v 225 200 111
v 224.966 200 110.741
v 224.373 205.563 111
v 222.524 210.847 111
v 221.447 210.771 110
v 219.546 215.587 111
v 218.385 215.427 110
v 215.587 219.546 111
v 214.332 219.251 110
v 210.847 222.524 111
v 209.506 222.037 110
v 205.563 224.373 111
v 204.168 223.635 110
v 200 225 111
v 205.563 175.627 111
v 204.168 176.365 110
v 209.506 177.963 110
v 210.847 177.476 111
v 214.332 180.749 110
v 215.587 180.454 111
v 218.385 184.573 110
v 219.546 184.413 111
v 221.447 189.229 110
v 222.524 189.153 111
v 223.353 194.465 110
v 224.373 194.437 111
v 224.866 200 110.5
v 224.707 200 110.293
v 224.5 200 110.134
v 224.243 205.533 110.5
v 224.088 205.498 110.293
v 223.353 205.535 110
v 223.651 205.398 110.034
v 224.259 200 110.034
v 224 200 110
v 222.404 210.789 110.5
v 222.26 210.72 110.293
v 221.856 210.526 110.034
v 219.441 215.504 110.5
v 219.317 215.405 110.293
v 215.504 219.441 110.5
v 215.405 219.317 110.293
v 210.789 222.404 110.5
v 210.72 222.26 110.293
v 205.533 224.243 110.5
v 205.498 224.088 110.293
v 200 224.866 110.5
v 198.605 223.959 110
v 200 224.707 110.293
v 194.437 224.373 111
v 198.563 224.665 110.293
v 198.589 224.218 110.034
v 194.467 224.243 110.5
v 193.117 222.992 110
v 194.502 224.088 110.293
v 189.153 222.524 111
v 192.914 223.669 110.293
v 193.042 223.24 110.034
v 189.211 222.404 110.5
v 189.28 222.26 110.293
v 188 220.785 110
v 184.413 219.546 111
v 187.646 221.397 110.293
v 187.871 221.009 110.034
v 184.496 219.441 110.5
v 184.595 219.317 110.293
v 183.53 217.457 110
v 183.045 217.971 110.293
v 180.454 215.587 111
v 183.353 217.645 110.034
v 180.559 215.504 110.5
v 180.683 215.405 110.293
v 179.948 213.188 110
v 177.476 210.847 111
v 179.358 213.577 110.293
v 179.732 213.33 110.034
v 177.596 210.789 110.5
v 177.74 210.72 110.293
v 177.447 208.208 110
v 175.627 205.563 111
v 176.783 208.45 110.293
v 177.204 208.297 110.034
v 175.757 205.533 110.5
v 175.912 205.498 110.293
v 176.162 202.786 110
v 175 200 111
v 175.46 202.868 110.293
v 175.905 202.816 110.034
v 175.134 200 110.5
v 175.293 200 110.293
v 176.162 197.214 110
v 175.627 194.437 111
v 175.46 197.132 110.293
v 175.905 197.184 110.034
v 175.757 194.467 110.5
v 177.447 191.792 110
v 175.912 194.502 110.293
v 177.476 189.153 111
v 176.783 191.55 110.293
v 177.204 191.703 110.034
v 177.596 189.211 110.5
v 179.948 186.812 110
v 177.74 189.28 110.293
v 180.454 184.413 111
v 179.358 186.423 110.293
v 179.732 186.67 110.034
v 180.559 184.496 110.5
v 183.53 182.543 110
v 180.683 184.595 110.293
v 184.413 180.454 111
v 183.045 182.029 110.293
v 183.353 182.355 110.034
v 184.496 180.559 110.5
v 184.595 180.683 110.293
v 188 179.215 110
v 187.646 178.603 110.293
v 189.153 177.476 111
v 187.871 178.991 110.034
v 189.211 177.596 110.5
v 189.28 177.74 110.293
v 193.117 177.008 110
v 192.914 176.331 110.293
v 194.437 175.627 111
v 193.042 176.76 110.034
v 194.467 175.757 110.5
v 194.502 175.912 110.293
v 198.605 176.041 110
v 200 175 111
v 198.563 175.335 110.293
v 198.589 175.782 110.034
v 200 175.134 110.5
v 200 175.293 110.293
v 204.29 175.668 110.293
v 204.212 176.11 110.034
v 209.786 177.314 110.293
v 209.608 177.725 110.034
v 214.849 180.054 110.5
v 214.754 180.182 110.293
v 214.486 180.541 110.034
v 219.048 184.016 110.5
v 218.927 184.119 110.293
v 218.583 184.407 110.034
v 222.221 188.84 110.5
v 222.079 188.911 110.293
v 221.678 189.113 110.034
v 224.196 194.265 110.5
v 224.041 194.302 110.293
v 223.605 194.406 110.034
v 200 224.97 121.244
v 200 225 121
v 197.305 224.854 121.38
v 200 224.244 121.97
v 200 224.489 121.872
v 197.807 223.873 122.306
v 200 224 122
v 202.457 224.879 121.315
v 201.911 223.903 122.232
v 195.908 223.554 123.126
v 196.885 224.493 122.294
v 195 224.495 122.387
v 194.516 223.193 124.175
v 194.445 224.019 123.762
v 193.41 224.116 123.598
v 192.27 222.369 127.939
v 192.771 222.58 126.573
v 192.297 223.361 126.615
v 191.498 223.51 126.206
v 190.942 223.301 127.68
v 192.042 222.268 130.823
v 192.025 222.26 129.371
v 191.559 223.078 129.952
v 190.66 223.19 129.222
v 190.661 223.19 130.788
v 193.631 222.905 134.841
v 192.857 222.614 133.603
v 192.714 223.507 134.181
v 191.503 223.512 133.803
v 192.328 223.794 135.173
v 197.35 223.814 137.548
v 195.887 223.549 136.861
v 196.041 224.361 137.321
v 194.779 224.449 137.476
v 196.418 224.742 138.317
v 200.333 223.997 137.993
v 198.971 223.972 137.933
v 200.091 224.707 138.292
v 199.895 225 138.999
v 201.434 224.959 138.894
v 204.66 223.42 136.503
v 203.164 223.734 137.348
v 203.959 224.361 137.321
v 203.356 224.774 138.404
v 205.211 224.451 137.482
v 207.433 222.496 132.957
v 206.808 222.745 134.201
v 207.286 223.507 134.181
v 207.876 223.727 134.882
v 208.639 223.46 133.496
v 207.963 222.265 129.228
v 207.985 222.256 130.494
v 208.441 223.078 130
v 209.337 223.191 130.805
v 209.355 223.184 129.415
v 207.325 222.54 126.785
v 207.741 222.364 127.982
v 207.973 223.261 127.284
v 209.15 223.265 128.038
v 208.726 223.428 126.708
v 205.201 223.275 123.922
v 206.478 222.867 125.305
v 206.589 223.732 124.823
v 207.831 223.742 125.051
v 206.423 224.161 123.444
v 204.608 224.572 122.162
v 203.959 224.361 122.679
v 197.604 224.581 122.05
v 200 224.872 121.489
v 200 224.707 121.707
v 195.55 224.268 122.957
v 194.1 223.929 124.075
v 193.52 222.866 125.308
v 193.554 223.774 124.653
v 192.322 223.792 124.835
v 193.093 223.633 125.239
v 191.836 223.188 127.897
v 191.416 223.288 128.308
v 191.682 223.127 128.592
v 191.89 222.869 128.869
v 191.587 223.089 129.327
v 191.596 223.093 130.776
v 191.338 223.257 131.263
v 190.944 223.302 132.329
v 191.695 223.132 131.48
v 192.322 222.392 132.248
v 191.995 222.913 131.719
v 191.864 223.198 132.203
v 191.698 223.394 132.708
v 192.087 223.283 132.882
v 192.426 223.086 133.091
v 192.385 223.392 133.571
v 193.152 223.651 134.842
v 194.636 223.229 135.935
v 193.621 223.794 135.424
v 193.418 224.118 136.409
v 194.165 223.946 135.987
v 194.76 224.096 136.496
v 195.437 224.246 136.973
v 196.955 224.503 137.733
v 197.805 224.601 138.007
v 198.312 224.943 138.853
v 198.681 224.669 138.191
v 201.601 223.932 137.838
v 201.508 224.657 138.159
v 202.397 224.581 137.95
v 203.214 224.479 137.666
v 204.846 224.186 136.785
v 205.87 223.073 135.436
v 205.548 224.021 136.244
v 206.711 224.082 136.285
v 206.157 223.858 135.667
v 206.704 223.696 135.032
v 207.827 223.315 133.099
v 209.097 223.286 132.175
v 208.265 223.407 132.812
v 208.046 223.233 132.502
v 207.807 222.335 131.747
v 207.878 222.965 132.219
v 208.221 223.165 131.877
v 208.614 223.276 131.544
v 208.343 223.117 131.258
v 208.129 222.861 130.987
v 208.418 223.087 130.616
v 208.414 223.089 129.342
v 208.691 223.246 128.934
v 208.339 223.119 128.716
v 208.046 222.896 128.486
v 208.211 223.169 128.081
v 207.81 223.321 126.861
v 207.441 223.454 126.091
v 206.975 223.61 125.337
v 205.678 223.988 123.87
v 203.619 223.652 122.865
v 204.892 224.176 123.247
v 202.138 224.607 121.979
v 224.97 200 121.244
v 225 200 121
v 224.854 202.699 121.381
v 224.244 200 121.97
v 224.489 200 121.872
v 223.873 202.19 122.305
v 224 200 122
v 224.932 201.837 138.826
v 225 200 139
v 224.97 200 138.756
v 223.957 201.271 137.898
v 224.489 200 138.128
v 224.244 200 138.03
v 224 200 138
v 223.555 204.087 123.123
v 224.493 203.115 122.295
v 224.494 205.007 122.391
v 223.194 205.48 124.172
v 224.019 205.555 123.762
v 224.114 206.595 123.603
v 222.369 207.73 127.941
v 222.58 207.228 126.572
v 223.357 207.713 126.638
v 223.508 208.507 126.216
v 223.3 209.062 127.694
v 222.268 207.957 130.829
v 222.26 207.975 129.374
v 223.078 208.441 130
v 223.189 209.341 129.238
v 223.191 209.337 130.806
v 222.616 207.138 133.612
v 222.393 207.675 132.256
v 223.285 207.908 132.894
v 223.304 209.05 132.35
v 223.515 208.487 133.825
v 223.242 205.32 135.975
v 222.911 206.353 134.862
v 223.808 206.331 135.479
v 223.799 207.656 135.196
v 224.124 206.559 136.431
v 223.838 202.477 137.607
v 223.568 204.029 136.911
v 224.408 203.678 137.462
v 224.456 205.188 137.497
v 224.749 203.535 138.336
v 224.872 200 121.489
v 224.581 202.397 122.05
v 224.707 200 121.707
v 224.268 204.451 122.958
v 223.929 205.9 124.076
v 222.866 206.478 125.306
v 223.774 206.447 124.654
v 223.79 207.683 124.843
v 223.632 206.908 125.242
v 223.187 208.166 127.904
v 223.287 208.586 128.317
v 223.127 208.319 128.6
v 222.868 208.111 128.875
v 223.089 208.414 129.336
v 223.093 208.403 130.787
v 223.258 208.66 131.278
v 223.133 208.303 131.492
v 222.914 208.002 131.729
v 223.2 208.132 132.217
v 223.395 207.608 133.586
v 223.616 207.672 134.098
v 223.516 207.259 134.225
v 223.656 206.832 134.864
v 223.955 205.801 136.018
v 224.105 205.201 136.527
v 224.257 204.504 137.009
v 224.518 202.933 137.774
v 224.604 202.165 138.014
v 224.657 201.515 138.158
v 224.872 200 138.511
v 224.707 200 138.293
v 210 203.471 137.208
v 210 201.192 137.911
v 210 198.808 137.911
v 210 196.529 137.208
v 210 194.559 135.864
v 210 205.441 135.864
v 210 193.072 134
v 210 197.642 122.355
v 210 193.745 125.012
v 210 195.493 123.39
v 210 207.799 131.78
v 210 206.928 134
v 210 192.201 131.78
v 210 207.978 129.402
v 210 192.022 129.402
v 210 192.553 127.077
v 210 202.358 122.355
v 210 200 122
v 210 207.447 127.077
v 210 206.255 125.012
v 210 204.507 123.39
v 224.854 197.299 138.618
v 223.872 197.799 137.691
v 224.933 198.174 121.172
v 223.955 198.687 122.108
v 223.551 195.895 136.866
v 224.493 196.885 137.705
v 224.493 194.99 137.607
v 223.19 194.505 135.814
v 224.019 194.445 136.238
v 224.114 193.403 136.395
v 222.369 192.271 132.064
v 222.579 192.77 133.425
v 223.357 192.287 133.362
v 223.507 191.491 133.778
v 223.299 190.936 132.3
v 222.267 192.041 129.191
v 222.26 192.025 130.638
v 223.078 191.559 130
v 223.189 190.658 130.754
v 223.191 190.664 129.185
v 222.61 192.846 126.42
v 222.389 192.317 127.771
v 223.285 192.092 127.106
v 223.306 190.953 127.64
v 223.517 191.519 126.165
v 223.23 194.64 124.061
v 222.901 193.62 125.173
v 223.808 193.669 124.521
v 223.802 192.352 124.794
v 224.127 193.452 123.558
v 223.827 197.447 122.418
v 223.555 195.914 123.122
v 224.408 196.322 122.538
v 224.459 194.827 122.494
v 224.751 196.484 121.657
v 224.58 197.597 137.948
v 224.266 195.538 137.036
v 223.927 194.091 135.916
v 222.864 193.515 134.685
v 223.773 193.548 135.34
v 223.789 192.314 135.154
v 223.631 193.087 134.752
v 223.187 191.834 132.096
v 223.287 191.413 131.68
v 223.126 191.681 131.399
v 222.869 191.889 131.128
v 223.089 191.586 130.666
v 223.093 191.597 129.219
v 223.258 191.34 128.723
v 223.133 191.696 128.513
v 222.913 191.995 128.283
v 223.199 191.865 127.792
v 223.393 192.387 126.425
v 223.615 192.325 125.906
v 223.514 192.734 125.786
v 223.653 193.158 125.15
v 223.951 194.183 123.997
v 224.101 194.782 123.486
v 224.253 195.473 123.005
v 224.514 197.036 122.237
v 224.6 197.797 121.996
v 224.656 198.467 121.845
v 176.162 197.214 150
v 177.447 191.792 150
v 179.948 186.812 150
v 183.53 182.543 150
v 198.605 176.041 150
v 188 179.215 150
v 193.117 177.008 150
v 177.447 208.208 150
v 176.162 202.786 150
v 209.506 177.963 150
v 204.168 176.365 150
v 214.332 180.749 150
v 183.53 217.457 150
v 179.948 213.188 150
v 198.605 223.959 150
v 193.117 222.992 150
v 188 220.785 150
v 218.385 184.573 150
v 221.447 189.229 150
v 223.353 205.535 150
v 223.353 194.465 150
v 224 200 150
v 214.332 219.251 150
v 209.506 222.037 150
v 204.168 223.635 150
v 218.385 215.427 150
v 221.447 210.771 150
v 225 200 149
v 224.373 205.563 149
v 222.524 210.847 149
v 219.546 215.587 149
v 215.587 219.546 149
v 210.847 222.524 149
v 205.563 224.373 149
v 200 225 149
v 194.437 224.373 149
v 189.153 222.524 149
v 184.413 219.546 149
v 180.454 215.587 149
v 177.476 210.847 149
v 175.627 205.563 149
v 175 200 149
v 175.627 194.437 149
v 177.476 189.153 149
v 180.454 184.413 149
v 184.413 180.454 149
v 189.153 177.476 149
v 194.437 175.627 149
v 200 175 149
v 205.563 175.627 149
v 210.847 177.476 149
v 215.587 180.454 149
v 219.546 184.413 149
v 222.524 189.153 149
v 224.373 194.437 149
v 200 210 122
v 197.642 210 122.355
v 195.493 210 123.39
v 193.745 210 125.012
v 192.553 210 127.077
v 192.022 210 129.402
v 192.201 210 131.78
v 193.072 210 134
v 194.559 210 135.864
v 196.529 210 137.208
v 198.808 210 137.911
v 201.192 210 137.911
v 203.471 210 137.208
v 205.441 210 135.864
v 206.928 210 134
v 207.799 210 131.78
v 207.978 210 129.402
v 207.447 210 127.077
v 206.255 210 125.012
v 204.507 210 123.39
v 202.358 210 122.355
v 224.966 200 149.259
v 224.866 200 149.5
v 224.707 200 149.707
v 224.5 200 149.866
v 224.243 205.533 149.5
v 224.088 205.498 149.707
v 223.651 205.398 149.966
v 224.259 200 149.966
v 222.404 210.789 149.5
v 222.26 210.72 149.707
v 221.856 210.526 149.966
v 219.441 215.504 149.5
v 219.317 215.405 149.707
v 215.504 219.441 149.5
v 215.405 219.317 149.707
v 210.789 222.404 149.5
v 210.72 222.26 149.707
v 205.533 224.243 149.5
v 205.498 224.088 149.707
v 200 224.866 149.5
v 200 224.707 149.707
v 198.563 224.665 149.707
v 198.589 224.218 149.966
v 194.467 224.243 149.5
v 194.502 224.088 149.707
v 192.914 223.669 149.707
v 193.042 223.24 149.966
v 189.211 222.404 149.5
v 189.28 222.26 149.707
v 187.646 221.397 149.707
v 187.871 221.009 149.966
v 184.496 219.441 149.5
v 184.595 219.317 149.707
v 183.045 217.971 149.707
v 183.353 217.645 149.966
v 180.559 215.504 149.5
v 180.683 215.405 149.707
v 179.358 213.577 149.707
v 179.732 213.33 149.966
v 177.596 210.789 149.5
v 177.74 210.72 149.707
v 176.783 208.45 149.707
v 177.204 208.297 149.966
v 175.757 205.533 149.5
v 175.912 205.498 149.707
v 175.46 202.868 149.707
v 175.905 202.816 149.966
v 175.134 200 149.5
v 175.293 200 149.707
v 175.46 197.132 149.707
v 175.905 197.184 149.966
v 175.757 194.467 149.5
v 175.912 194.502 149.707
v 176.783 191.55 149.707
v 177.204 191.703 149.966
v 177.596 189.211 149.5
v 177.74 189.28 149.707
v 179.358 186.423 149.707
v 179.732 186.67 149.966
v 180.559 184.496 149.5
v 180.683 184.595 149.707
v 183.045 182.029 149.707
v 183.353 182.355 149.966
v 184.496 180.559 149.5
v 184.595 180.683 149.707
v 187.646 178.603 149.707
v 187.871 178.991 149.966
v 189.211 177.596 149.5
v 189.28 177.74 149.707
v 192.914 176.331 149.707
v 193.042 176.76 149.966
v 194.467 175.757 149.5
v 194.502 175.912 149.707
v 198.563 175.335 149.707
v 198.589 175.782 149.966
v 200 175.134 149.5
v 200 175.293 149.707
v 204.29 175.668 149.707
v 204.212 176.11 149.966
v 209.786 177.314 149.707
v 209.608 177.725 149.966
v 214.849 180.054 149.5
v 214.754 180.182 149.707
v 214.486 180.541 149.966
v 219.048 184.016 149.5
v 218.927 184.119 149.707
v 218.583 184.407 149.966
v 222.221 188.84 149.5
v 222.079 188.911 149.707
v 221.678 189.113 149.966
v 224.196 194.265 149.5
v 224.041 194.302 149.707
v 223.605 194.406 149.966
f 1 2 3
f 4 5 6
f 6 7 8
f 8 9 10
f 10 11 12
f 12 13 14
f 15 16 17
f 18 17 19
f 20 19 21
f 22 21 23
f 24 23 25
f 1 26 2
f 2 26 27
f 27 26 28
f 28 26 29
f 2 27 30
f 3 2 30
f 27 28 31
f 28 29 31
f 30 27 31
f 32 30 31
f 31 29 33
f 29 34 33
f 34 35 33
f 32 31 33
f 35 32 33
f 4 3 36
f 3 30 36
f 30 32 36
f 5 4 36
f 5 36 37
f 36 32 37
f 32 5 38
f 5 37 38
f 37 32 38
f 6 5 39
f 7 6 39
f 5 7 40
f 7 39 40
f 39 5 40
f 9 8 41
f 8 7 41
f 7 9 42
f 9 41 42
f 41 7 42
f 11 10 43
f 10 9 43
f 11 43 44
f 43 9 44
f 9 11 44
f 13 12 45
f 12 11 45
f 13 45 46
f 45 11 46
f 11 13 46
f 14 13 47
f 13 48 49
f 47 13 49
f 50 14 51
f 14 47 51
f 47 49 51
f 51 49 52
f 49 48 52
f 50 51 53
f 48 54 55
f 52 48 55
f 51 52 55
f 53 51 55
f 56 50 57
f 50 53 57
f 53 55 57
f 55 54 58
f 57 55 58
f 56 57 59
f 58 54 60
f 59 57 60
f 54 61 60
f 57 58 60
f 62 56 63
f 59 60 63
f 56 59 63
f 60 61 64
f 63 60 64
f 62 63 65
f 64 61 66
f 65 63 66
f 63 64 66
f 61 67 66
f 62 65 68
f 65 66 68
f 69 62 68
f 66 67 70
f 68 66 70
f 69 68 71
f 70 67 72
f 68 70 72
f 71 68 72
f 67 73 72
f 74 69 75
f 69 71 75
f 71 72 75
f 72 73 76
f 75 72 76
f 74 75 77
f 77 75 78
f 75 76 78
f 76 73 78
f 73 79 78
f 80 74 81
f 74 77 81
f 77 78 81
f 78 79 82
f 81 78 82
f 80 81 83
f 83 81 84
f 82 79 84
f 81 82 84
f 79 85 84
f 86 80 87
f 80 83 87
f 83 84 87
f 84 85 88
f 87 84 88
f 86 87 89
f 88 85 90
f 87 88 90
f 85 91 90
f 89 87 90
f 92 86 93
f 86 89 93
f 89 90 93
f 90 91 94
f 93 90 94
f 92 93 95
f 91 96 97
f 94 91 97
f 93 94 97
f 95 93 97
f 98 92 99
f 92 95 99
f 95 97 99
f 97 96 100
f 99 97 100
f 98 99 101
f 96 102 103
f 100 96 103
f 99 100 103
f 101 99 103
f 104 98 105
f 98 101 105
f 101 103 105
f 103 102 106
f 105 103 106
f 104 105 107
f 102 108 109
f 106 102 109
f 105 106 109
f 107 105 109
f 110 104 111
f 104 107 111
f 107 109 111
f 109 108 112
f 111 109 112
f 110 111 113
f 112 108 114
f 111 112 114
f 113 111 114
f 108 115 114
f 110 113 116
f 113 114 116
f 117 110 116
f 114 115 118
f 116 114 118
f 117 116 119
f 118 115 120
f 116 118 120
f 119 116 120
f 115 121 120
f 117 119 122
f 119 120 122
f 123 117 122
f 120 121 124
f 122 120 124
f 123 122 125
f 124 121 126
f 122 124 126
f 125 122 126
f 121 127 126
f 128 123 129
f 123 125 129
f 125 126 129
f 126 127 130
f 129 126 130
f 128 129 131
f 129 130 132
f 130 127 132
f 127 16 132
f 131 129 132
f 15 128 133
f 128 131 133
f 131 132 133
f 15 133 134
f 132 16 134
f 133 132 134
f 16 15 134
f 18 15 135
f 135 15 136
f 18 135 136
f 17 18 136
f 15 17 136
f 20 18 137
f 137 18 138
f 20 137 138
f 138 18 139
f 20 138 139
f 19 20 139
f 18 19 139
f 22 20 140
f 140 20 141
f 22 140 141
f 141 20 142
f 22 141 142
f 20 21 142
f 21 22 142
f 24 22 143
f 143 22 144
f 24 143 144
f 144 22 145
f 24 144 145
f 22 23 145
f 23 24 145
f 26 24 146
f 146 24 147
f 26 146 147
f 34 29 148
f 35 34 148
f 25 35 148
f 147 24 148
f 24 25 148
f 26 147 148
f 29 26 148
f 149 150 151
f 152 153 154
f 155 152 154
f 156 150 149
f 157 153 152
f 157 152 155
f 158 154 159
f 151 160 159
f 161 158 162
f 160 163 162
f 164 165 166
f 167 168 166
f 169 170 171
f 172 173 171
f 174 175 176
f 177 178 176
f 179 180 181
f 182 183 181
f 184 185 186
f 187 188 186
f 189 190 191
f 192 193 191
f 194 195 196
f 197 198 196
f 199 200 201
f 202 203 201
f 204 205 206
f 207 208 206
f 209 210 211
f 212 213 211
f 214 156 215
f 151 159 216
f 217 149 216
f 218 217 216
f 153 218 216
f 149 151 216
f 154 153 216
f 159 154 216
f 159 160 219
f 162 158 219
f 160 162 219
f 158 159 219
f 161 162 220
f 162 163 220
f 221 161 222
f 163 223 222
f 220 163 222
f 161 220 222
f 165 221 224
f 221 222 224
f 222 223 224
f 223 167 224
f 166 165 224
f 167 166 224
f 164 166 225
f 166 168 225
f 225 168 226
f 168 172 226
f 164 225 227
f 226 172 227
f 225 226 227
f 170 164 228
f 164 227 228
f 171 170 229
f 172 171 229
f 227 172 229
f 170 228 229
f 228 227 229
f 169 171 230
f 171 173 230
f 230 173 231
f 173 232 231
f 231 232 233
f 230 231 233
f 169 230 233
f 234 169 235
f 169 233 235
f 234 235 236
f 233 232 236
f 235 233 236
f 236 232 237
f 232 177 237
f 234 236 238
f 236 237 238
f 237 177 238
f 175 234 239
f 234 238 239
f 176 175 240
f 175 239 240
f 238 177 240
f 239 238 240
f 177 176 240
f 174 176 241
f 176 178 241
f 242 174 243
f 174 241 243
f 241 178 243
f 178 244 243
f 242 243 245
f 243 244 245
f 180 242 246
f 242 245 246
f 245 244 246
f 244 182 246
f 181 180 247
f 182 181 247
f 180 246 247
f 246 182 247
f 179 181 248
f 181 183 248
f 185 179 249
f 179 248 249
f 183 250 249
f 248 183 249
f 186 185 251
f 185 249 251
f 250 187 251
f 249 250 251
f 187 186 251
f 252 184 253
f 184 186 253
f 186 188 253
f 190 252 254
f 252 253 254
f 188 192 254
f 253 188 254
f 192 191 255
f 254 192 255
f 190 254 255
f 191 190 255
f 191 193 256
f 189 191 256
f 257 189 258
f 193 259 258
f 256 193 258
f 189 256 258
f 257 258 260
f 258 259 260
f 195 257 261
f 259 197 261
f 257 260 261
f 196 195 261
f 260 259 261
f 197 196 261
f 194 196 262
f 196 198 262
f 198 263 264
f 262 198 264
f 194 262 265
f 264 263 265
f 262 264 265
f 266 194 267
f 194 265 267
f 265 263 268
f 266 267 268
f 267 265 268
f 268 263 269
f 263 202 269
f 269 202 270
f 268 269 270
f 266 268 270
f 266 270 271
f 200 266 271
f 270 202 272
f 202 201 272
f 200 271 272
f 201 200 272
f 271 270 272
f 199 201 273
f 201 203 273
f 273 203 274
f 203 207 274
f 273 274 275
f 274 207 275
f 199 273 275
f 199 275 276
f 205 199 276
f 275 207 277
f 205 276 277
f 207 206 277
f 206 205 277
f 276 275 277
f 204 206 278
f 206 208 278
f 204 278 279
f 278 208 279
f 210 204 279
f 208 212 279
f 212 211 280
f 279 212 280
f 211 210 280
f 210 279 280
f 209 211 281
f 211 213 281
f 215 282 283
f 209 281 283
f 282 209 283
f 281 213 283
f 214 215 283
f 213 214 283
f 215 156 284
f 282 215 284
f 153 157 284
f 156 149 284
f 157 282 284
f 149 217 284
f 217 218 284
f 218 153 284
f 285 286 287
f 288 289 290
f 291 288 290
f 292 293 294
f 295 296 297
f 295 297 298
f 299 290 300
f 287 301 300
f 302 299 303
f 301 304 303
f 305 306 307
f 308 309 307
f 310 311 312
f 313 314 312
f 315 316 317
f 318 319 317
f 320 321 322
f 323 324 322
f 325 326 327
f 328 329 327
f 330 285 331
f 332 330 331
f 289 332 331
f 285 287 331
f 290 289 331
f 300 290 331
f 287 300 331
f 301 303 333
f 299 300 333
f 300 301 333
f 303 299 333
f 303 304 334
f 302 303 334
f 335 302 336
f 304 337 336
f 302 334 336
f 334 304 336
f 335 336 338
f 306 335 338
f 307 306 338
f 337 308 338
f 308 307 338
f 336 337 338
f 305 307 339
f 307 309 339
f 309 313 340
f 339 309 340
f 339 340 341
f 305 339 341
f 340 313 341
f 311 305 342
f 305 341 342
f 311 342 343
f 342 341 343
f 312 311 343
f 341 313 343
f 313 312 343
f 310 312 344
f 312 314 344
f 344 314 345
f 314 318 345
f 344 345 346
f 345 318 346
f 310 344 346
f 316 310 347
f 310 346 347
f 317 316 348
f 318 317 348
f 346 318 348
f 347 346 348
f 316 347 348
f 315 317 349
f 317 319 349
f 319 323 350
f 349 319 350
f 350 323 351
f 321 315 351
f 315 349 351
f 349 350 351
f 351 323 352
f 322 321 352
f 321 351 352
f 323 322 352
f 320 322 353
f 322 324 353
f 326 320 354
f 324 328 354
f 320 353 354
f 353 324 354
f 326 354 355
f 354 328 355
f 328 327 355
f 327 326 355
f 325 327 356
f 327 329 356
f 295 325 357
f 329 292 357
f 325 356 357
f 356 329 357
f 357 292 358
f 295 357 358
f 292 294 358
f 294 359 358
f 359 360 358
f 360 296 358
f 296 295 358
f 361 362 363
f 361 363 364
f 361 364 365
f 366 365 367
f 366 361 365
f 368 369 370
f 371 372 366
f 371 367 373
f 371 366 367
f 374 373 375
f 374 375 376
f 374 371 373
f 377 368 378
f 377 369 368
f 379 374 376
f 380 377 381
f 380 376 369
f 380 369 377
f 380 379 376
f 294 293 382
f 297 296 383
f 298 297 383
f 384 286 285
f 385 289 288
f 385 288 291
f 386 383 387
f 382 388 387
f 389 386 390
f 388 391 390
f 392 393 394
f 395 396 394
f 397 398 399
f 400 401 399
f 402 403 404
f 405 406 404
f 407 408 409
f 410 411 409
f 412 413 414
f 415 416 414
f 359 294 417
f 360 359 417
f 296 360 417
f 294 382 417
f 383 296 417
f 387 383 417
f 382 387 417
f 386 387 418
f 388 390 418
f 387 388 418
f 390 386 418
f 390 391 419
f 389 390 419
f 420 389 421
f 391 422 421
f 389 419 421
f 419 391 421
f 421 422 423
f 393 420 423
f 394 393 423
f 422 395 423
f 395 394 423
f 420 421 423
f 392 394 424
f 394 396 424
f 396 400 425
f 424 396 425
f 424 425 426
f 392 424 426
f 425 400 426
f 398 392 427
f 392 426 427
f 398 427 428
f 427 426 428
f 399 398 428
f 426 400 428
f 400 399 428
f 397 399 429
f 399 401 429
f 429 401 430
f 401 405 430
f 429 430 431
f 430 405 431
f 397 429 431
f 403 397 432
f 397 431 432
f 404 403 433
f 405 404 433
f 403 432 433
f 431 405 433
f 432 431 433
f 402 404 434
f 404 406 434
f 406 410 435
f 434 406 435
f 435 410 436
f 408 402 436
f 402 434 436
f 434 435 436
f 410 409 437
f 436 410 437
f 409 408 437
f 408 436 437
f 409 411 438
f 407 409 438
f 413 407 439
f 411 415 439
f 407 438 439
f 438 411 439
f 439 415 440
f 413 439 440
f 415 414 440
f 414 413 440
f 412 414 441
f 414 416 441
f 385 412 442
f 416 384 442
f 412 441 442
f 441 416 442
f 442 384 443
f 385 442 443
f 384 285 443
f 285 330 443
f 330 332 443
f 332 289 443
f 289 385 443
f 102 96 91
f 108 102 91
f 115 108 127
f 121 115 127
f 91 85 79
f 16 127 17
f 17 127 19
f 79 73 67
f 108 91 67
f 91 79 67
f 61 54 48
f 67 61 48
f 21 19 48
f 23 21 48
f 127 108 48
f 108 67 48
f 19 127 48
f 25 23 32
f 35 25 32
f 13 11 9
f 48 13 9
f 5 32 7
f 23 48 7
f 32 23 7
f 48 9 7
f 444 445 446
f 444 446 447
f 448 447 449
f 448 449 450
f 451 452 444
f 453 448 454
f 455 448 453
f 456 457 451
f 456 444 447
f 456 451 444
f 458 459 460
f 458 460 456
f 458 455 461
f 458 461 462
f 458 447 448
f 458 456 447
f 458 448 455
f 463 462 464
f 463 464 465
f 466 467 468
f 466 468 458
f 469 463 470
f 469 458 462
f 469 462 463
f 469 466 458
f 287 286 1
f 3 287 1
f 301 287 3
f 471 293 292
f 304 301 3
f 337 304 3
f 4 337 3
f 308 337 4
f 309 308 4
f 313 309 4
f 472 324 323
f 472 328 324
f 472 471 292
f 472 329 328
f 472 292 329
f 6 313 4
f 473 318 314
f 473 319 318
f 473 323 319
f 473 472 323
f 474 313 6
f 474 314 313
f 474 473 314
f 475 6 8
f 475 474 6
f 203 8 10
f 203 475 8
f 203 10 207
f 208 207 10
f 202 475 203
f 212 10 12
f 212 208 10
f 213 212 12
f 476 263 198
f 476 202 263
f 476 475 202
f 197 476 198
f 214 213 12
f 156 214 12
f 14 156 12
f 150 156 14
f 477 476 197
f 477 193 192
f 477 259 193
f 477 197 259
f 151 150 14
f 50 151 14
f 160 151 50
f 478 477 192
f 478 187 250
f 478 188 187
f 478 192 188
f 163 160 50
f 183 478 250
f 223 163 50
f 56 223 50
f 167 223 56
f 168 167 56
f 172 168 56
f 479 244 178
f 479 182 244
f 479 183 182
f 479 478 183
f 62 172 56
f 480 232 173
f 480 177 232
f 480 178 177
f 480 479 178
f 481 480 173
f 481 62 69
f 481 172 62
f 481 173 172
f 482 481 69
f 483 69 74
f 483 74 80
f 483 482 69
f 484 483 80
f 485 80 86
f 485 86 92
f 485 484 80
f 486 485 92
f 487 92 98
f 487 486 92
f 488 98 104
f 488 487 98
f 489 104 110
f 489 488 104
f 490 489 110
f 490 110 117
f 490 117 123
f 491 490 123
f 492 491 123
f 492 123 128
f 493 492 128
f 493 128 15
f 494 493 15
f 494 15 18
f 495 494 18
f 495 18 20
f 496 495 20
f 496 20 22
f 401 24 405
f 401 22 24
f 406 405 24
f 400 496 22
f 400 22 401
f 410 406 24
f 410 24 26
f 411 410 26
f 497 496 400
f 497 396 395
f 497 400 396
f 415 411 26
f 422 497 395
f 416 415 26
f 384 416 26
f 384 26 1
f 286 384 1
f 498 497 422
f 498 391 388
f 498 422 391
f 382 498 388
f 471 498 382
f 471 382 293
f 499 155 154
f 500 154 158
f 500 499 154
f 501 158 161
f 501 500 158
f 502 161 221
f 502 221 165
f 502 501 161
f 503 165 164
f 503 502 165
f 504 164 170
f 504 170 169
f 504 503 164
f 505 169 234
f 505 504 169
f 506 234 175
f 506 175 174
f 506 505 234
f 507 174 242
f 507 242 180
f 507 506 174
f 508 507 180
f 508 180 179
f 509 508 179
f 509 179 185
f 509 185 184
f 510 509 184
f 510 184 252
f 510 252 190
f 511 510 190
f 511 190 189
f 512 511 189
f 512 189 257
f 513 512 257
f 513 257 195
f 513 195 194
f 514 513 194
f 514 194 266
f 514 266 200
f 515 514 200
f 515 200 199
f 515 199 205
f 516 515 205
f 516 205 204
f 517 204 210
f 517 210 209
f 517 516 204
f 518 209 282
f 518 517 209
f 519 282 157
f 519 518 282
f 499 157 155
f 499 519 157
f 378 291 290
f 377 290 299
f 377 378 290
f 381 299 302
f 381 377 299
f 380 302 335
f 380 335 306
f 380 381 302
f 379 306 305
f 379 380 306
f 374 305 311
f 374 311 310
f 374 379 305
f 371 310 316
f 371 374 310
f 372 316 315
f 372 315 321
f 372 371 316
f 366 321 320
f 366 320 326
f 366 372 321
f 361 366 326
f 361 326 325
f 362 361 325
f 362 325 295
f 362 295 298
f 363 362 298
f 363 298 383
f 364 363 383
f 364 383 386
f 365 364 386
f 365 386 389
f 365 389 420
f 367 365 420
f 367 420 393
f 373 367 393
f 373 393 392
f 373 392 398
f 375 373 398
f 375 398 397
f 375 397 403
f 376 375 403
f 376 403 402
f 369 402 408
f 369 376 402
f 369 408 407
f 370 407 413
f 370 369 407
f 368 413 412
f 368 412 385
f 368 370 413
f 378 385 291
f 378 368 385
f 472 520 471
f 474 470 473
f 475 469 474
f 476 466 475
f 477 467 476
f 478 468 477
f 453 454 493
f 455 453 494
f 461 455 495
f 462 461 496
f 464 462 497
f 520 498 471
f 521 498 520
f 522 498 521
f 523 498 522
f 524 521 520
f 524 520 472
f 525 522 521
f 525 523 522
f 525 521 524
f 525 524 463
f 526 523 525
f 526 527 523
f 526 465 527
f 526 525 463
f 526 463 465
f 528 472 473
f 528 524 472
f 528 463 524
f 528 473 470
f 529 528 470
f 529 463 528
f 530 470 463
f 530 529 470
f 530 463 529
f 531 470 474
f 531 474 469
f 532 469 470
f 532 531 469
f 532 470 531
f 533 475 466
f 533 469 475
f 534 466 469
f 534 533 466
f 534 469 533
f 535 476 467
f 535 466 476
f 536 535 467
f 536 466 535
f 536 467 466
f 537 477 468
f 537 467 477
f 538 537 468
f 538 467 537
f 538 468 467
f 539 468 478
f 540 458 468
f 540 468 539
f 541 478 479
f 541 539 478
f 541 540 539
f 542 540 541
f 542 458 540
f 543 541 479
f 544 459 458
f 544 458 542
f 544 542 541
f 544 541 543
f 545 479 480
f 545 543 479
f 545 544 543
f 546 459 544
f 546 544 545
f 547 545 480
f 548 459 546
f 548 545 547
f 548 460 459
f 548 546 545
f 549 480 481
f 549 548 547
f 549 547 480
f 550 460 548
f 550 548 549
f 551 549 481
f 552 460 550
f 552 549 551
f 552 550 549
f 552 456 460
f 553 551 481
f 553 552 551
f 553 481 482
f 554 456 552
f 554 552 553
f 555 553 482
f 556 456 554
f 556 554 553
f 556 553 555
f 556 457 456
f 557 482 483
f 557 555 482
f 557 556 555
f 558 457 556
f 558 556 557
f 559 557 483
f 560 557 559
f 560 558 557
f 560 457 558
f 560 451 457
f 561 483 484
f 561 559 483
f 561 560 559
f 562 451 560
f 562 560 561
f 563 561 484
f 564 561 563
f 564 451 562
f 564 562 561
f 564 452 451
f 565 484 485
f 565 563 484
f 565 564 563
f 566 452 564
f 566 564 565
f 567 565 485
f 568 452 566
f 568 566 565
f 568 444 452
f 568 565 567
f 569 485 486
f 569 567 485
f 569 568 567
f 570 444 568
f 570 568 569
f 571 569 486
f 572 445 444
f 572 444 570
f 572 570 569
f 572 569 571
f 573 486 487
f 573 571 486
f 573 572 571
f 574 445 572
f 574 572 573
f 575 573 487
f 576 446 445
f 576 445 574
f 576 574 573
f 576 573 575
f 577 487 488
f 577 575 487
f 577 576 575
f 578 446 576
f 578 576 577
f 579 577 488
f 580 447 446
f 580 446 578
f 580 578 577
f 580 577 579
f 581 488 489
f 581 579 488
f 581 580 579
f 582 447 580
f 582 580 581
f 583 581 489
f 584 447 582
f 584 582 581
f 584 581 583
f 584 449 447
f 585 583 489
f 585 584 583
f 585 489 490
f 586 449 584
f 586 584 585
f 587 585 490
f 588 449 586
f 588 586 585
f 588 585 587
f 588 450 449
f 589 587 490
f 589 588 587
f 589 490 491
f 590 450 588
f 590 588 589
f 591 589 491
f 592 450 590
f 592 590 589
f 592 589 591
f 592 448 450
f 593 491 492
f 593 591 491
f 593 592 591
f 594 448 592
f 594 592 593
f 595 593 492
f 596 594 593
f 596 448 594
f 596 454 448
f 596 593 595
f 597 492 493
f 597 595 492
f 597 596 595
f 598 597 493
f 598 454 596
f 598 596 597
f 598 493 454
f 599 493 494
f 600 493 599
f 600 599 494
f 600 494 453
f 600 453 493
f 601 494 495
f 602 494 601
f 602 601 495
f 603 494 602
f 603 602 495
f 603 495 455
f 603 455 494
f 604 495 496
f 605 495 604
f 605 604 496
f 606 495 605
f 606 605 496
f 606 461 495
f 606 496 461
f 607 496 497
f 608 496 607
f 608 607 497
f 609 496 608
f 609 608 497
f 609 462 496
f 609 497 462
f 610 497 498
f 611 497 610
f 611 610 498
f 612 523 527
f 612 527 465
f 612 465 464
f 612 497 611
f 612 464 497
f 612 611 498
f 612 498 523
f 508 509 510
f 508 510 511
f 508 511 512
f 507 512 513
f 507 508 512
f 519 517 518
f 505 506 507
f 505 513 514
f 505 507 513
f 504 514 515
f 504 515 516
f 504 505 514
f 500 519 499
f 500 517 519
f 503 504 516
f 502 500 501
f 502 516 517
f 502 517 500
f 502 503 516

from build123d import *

# Parameters (mm, degrees)
SKETCH20_R          = 25
BOSS_EXTRUDE6_DEPTH = 40
SKETCH21_R          = 8
CUT_EXTRUDE2_DEPTH  = 26
CIRPATTERN1_COUNT   = 2
CIRPATTERN1_ANGLE   = 90
FILLET5_R           = 1


with BuildPart() as part:
    # Sketch20 → Boss-Extrude6 (new body)
    with BuildSketch(Plane.XY.offset(150)):
        with Locations((200, 200)):
            Circle(SKETCH20_R)
    extrude(amount=-BOSS_EXTRUDE6_DEPTH)

    # Sketch21 → Cut-Extrude2 (cut)
    with BuildSketch(Plane(origin=(0, 210, 0), x_dir=(1, 0, 0), z_dir=(0, 1, 0))):
        with Locations((200, -130)):
            Circle(SKETCH21_R)
    cut_extrude2 = extrude(amount=CUT_EXTRUDE2_DEPTH, mode=Mode.SUBTRACT)

    # CirPattern1: Cut-Extrude2 ×2 about axis
    cirpattern1_axis = Axis((200, 200, 110), (0, 0, -1))
    for i in range(1, CIRPATTERN1_COUNT):
        add(cut_extrude2.rotate(cirpattern1_axis, i * CIRPATTERN1_ANGLE / (CIRPATTERN1_COUNT - 1)), mode=Mode.SUBTRACT)

    # Fillet5
    fillet5_edges = [part.edges().sort_by_distance(p)[0] for p in [
        (223.685438565, 208, 130),
        (192, 223.685438565, 130),
        (175, 200, 110),
        (175, 200, 150),
    ]]
    fillet(fillet5_edges, radius=FILLET5_R)


solid = part.part
